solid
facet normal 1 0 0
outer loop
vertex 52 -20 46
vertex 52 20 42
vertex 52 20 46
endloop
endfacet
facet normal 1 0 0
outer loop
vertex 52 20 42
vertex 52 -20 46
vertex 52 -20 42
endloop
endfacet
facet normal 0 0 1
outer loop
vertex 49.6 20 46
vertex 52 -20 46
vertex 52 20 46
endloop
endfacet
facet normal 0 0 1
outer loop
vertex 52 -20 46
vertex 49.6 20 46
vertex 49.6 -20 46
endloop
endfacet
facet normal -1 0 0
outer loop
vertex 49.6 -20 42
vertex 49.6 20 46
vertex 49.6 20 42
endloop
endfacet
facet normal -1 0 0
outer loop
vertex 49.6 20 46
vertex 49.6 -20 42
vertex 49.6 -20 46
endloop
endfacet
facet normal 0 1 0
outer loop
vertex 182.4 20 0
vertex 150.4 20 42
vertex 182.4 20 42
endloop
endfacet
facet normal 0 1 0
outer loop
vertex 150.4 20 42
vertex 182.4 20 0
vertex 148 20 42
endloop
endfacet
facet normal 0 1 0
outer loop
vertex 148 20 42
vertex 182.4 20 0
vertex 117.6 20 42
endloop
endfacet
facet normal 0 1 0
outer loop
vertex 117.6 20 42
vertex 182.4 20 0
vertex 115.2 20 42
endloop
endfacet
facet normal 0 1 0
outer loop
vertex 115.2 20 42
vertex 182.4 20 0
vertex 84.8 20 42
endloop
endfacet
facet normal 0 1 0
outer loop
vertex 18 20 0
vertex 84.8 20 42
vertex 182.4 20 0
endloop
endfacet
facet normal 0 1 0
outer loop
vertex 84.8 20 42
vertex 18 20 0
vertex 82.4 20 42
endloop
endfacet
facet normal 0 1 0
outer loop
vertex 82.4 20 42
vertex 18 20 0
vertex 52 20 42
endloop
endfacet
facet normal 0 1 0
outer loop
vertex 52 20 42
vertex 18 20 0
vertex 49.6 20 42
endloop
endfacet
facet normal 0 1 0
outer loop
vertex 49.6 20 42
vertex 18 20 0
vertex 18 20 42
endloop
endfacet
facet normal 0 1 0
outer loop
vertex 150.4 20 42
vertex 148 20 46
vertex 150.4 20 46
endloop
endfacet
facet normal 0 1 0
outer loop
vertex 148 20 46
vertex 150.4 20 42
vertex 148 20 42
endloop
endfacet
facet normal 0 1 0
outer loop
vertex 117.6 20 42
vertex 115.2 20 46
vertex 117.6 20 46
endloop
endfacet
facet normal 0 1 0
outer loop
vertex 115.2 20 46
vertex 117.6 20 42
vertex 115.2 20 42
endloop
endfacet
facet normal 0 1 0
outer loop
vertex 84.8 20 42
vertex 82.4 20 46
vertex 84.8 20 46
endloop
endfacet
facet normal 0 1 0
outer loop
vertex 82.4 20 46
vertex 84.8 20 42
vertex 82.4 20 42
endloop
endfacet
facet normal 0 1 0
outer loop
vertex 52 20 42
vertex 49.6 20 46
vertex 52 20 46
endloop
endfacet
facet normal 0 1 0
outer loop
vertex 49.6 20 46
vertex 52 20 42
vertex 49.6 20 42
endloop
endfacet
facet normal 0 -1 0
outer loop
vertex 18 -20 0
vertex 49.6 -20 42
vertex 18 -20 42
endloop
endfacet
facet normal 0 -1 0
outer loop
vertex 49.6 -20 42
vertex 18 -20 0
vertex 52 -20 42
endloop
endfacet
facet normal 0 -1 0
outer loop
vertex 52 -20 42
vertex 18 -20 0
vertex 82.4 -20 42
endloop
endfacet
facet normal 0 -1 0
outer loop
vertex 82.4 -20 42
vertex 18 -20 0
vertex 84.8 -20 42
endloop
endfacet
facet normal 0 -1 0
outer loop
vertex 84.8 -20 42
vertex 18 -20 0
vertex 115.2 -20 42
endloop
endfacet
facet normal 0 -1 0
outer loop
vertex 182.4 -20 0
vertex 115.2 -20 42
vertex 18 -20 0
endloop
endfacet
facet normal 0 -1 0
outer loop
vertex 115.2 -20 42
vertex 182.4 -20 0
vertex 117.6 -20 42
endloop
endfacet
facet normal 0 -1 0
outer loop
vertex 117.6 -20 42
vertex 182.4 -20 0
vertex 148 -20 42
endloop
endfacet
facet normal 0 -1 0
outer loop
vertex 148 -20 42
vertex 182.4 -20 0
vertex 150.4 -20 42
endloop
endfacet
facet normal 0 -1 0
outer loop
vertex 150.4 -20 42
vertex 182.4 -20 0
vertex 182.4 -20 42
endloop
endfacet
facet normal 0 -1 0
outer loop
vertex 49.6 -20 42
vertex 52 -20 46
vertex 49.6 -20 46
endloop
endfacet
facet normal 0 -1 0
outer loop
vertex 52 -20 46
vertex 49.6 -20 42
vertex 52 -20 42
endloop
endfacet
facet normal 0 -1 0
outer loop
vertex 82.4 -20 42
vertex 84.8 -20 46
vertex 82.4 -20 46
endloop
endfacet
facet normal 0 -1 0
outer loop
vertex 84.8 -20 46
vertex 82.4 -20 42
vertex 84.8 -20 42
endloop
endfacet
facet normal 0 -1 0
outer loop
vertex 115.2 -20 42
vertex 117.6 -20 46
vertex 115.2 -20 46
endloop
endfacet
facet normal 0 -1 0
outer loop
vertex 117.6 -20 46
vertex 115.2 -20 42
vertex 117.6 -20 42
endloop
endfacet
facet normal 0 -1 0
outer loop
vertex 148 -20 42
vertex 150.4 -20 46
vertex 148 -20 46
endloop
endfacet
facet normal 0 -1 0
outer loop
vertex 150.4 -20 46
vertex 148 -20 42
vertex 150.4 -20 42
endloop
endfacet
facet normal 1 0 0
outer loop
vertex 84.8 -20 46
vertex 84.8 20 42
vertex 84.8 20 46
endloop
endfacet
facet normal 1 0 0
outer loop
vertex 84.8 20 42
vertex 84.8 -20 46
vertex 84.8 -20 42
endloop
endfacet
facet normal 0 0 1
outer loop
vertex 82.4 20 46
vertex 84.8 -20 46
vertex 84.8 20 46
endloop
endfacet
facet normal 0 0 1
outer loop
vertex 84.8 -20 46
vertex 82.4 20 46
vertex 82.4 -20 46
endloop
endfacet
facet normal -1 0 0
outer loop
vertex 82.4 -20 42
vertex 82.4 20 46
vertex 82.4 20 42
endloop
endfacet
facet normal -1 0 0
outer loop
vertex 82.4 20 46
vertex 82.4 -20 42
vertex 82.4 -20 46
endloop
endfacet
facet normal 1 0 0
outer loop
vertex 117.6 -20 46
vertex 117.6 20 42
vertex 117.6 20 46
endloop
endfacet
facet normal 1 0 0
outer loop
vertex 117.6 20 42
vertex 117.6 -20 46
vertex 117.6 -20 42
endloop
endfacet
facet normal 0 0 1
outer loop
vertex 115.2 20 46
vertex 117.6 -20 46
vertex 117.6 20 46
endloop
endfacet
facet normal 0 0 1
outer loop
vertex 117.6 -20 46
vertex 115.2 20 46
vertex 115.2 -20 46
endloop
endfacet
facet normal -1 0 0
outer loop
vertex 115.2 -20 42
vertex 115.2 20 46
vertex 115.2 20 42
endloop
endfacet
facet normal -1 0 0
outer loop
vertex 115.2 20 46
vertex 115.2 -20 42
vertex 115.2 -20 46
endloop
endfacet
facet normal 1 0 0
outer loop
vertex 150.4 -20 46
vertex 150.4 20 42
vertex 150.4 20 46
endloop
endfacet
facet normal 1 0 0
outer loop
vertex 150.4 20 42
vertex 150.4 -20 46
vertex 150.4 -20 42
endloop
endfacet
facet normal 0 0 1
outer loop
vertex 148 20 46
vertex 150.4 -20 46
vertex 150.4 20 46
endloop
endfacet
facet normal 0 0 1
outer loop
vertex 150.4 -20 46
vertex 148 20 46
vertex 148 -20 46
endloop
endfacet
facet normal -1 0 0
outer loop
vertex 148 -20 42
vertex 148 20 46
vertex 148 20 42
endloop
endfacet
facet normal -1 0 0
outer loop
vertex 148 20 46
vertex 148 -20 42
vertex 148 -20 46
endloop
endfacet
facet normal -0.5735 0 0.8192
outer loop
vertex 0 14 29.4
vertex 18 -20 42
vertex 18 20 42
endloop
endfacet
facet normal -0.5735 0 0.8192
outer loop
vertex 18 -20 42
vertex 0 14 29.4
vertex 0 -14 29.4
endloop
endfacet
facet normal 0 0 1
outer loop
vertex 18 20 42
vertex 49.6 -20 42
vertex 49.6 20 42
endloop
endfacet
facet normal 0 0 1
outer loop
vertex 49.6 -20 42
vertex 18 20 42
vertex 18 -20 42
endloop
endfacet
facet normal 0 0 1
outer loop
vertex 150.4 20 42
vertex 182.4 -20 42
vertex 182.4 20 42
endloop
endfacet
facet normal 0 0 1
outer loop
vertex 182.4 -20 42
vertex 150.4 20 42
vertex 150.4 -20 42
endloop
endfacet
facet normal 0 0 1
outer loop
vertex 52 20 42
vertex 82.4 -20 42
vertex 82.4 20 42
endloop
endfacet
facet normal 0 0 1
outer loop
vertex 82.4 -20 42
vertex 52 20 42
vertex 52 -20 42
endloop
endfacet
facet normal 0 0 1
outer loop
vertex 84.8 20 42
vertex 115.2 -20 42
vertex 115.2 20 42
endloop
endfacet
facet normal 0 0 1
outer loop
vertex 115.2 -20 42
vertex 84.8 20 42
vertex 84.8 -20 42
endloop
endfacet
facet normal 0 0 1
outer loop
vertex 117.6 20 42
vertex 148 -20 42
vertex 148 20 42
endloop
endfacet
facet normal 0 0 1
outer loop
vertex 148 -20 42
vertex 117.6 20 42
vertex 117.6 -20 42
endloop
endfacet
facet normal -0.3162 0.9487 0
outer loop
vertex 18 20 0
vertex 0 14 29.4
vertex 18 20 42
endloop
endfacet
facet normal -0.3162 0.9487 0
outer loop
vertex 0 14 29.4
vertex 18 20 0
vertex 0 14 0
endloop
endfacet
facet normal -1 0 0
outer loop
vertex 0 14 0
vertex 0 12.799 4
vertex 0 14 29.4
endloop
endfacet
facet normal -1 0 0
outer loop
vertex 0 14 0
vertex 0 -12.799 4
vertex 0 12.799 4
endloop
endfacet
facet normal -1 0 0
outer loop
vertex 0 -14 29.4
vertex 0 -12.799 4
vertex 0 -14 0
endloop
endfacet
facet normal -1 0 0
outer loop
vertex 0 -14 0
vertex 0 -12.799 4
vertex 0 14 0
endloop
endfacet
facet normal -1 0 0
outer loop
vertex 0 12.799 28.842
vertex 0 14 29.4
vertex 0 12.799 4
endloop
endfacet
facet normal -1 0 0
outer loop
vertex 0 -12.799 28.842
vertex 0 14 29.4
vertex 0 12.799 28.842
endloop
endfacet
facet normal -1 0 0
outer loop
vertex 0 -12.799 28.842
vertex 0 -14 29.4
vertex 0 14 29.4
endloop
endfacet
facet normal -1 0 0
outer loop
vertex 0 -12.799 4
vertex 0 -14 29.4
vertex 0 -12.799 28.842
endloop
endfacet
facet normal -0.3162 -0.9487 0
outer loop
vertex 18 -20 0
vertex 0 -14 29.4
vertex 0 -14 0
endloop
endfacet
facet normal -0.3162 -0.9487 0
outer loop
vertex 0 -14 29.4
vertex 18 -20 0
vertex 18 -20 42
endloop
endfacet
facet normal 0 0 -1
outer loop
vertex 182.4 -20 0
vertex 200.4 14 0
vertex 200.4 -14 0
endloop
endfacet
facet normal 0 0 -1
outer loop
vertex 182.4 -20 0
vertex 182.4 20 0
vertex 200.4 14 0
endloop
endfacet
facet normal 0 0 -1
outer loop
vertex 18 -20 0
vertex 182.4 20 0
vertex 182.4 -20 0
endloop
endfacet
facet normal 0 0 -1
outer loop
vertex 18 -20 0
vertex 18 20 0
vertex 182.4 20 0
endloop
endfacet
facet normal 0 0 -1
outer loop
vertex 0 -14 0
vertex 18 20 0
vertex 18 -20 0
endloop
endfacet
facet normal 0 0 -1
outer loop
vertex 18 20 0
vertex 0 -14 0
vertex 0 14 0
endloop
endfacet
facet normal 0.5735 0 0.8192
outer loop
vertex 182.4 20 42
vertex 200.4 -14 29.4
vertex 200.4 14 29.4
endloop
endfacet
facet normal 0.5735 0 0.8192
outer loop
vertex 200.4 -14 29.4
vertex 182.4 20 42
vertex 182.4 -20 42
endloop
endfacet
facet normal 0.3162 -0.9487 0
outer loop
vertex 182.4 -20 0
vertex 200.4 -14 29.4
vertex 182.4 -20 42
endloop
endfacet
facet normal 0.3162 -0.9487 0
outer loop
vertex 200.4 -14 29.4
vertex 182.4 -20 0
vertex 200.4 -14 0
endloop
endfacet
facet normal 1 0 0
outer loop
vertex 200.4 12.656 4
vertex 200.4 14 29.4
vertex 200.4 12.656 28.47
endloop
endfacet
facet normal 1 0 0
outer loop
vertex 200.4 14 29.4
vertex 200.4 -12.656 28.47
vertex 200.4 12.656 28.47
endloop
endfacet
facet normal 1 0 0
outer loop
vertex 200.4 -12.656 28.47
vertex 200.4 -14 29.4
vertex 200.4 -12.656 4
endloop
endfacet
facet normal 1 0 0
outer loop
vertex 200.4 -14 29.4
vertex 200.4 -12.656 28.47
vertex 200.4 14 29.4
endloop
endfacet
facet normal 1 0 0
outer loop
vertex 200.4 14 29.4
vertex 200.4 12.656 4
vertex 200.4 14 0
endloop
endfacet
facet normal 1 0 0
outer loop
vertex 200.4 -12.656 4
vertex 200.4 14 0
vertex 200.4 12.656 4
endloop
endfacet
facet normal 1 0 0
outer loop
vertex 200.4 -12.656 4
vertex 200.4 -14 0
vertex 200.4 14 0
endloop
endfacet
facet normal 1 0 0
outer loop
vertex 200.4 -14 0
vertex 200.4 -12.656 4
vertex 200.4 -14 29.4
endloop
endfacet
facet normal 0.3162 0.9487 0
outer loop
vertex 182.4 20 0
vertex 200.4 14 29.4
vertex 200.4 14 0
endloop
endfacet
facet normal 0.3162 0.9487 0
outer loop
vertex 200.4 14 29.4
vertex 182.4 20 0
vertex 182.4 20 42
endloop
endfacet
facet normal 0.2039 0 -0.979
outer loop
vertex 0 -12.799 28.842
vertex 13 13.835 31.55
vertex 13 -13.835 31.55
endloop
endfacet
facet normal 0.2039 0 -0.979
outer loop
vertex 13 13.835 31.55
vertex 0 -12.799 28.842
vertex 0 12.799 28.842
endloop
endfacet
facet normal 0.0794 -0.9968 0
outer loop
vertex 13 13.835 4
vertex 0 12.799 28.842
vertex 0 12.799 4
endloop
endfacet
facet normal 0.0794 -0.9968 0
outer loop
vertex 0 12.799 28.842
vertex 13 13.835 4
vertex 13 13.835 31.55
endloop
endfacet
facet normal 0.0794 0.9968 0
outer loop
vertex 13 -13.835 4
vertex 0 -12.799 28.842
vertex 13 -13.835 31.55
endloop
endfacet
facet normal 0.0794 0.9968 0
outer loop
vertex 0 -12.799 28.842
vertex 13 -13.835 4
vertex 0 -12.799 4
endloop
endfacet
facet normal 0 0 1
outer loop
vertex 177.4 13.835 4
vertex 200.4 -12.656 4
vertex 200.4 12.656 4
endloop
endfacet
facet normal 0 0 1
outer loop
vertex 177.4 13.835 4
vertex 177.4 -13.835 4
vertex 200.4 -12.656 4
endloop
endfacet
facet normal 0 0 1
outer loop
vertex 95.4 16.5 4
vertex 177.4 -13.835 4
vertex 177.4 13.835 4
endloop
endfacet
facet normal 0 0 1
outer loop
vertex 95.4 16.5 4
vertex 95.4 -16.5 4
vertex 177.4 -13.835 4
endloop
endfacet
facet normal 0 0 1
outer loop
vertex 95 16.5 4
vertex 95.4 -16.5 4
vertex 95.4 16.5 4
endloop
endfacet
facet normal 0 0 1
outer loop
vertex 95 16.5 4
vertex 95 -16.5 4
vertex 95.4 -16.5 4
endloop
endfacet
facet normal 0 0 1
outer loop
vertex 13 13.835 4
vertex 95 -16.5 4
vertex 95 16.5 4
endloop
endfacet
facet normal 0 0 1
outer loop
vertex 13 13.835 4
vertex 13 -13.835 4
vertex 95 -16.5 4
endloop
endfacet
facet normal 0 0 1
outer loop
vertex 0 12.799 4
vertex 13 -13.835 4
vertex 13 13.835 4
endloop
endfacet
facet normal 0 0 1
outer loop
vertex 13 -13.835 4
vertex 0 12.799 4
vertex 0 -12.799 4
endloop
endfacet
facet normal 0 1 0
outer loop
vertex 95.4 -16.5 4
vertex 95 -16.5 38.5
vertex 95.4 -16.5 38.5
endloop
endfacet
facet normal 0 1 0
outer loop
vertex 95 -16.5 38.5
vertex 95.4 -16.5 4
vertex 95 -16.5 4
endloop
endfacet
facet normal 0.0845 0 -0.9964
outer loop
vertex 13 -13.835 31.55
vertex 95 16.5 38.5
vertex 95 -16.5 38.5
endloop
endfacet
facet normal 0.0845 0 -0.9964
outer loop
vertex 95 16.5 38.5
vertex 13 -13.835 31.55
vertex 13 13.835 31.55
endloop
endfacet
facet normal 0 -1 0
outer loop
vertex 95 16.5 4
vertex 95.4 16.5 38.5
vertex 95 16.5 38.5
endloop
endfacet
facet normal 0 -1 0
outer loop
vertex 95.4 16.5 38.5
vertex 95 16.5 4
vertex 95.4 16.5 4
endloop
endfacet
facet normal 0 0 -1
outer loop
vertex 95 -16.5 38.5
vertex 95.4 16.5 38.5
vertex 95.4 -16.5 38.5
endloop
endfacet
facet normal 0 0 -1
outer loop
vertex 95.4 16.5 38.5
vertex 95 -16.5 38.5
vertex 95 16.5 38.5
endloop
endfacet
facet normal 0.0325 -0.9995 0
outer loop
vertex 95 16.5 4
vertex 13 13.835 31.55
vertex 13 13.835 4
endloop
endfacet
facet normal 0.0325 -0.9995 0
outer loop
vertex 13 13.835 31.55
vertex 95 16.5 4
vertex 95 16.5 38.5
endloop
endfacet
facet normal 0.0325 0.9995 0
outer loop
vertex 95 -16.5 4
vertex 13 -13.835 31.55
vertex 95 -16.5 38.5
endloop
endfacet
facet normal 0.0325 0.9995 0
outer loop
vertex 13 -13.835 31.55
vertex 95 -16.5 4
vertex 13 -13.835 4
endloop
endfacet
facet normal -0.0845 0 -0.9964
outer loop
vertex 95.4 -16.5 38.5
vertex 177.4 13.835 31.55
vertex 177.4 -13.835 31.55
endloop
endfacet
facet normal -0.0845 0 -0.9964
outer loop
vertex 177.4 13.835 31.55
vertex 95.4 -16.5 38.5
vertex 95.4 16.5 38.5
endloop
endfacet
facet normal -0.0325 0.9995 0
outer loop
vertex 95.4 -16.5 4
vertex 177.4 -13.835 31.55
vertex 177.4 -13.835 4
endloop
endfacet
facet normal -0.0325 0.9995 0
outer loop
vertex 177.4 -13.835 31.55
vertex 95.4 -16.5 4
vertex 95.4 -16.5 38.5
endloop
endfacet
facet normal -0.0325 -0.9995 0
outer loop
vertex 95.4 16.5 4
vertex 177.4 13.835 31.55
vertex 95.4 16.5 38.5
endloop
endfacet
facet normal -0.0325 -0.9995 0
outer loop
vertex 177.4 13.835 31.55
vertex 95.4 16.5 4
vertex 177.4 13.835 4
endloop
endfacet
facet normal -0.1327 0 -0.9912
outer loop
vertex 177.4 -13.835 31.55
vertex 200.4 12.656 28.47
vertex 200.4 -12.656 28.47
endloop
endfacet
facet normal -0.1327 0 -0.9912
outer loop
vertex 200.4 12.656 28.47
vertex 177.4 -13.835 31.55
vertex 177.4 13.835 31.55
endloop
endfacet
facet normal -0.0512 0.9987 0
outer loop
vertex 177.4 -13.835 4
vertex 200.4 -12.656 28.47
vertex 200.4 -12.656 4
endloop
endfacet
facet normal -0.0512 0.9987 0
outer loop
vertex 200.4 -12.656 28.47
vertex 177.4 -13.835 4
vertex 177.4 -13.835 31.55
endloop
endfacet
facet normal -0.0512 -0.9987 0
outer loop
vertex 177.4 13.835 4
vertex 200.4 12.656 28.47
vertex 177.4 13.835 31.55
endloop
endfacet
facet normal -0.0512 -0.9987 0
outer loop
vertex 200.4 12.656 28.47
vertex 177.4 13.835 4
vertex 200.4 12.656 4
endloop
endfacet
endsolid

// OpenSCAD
$fn = 32;

// ----------------------------------------------------------------------
// Faired channel: 200 x 40 x 42 mm, 3.5 mm walls, faired ends
// ----------------------------------------------------------------------

// --- parameters (mm) ---
length = 200;             // channel length
width = 40;               // channel width at mid length
height = 42;              // channel height at mid length
wall = 3.5;               // side wall thickness
floor_t = 4;              // floor thickness
end_w = 28;               // faired end width
end_h = 29.4;             // faired end height
ribs = 4;                 // stiffening ribs on the top
rib_t = 2.4;              // rib thickness
rib_h = 4;                // rib height

difference() {
  union() {
    hull() {
      translate([0, -14, 0]) cube([0.4, 28, 29.4]);
      translate([18, -20, 0]) cube([0.4, 40, 42]);
    }
    hull() {
      translate([18, -20, 0]) cube([0.4, 40, 42]);
      translate([100, -20, 0]) cube([0.4, 40, 42]);
    }
    hull() {
      translate([100, -20, 0]) cube([0.4, 40, 42]);
      translate([182, -20, 0]) cube([0.4, 40, 42]);
    }
    hull() {
      translate([182, -20, 0]) cube([0.4, 40, 42]);
      translate([200, -14, 0]) cube([0.4, 28, 29.4]);
    }
    /* stiffening ribs across the flat top, sunk 0.8 mm into it */
    for (i = [1 : ribs]) {
      translate([18 + i * (length - 2 * 18) / (ribs + 1) - rib_t / 2, -width / 2, height - 0.8]) cube([rib_t, width, rib_h + 0.8]);
    }
  }
  /* cavity, 5 mm proud of both ends so the ports are cut clean */
  hull() {
    translate([-5, -12.4, 4]) cube([0.4, 24.8, 23.8]);
    translate([13, -13.835, 4]) cube([0.4, 27.67, 27.55]);
  }
  hull() {
    translate([13, -13.835, 4]) cube([0.4, 27.67, 27.55]);
    translate([95, -16.5, 4]) cube([0.4, 33, 34.5]);
  }
  hull() {
    translate([95, -16.5, 4]) cube([0.4, 33, 34.5]);
    translate([177, -13.835, 4]) cube([0.4, 27.67, 27.55]);
  }
  hull() {
    translate([177, -13.835, 4]) cube([0.4, 27.67, 27.55]);
    translate([205, -12.4, 4]) cube([0.4, 24.8, 23.8]);
  }
}
